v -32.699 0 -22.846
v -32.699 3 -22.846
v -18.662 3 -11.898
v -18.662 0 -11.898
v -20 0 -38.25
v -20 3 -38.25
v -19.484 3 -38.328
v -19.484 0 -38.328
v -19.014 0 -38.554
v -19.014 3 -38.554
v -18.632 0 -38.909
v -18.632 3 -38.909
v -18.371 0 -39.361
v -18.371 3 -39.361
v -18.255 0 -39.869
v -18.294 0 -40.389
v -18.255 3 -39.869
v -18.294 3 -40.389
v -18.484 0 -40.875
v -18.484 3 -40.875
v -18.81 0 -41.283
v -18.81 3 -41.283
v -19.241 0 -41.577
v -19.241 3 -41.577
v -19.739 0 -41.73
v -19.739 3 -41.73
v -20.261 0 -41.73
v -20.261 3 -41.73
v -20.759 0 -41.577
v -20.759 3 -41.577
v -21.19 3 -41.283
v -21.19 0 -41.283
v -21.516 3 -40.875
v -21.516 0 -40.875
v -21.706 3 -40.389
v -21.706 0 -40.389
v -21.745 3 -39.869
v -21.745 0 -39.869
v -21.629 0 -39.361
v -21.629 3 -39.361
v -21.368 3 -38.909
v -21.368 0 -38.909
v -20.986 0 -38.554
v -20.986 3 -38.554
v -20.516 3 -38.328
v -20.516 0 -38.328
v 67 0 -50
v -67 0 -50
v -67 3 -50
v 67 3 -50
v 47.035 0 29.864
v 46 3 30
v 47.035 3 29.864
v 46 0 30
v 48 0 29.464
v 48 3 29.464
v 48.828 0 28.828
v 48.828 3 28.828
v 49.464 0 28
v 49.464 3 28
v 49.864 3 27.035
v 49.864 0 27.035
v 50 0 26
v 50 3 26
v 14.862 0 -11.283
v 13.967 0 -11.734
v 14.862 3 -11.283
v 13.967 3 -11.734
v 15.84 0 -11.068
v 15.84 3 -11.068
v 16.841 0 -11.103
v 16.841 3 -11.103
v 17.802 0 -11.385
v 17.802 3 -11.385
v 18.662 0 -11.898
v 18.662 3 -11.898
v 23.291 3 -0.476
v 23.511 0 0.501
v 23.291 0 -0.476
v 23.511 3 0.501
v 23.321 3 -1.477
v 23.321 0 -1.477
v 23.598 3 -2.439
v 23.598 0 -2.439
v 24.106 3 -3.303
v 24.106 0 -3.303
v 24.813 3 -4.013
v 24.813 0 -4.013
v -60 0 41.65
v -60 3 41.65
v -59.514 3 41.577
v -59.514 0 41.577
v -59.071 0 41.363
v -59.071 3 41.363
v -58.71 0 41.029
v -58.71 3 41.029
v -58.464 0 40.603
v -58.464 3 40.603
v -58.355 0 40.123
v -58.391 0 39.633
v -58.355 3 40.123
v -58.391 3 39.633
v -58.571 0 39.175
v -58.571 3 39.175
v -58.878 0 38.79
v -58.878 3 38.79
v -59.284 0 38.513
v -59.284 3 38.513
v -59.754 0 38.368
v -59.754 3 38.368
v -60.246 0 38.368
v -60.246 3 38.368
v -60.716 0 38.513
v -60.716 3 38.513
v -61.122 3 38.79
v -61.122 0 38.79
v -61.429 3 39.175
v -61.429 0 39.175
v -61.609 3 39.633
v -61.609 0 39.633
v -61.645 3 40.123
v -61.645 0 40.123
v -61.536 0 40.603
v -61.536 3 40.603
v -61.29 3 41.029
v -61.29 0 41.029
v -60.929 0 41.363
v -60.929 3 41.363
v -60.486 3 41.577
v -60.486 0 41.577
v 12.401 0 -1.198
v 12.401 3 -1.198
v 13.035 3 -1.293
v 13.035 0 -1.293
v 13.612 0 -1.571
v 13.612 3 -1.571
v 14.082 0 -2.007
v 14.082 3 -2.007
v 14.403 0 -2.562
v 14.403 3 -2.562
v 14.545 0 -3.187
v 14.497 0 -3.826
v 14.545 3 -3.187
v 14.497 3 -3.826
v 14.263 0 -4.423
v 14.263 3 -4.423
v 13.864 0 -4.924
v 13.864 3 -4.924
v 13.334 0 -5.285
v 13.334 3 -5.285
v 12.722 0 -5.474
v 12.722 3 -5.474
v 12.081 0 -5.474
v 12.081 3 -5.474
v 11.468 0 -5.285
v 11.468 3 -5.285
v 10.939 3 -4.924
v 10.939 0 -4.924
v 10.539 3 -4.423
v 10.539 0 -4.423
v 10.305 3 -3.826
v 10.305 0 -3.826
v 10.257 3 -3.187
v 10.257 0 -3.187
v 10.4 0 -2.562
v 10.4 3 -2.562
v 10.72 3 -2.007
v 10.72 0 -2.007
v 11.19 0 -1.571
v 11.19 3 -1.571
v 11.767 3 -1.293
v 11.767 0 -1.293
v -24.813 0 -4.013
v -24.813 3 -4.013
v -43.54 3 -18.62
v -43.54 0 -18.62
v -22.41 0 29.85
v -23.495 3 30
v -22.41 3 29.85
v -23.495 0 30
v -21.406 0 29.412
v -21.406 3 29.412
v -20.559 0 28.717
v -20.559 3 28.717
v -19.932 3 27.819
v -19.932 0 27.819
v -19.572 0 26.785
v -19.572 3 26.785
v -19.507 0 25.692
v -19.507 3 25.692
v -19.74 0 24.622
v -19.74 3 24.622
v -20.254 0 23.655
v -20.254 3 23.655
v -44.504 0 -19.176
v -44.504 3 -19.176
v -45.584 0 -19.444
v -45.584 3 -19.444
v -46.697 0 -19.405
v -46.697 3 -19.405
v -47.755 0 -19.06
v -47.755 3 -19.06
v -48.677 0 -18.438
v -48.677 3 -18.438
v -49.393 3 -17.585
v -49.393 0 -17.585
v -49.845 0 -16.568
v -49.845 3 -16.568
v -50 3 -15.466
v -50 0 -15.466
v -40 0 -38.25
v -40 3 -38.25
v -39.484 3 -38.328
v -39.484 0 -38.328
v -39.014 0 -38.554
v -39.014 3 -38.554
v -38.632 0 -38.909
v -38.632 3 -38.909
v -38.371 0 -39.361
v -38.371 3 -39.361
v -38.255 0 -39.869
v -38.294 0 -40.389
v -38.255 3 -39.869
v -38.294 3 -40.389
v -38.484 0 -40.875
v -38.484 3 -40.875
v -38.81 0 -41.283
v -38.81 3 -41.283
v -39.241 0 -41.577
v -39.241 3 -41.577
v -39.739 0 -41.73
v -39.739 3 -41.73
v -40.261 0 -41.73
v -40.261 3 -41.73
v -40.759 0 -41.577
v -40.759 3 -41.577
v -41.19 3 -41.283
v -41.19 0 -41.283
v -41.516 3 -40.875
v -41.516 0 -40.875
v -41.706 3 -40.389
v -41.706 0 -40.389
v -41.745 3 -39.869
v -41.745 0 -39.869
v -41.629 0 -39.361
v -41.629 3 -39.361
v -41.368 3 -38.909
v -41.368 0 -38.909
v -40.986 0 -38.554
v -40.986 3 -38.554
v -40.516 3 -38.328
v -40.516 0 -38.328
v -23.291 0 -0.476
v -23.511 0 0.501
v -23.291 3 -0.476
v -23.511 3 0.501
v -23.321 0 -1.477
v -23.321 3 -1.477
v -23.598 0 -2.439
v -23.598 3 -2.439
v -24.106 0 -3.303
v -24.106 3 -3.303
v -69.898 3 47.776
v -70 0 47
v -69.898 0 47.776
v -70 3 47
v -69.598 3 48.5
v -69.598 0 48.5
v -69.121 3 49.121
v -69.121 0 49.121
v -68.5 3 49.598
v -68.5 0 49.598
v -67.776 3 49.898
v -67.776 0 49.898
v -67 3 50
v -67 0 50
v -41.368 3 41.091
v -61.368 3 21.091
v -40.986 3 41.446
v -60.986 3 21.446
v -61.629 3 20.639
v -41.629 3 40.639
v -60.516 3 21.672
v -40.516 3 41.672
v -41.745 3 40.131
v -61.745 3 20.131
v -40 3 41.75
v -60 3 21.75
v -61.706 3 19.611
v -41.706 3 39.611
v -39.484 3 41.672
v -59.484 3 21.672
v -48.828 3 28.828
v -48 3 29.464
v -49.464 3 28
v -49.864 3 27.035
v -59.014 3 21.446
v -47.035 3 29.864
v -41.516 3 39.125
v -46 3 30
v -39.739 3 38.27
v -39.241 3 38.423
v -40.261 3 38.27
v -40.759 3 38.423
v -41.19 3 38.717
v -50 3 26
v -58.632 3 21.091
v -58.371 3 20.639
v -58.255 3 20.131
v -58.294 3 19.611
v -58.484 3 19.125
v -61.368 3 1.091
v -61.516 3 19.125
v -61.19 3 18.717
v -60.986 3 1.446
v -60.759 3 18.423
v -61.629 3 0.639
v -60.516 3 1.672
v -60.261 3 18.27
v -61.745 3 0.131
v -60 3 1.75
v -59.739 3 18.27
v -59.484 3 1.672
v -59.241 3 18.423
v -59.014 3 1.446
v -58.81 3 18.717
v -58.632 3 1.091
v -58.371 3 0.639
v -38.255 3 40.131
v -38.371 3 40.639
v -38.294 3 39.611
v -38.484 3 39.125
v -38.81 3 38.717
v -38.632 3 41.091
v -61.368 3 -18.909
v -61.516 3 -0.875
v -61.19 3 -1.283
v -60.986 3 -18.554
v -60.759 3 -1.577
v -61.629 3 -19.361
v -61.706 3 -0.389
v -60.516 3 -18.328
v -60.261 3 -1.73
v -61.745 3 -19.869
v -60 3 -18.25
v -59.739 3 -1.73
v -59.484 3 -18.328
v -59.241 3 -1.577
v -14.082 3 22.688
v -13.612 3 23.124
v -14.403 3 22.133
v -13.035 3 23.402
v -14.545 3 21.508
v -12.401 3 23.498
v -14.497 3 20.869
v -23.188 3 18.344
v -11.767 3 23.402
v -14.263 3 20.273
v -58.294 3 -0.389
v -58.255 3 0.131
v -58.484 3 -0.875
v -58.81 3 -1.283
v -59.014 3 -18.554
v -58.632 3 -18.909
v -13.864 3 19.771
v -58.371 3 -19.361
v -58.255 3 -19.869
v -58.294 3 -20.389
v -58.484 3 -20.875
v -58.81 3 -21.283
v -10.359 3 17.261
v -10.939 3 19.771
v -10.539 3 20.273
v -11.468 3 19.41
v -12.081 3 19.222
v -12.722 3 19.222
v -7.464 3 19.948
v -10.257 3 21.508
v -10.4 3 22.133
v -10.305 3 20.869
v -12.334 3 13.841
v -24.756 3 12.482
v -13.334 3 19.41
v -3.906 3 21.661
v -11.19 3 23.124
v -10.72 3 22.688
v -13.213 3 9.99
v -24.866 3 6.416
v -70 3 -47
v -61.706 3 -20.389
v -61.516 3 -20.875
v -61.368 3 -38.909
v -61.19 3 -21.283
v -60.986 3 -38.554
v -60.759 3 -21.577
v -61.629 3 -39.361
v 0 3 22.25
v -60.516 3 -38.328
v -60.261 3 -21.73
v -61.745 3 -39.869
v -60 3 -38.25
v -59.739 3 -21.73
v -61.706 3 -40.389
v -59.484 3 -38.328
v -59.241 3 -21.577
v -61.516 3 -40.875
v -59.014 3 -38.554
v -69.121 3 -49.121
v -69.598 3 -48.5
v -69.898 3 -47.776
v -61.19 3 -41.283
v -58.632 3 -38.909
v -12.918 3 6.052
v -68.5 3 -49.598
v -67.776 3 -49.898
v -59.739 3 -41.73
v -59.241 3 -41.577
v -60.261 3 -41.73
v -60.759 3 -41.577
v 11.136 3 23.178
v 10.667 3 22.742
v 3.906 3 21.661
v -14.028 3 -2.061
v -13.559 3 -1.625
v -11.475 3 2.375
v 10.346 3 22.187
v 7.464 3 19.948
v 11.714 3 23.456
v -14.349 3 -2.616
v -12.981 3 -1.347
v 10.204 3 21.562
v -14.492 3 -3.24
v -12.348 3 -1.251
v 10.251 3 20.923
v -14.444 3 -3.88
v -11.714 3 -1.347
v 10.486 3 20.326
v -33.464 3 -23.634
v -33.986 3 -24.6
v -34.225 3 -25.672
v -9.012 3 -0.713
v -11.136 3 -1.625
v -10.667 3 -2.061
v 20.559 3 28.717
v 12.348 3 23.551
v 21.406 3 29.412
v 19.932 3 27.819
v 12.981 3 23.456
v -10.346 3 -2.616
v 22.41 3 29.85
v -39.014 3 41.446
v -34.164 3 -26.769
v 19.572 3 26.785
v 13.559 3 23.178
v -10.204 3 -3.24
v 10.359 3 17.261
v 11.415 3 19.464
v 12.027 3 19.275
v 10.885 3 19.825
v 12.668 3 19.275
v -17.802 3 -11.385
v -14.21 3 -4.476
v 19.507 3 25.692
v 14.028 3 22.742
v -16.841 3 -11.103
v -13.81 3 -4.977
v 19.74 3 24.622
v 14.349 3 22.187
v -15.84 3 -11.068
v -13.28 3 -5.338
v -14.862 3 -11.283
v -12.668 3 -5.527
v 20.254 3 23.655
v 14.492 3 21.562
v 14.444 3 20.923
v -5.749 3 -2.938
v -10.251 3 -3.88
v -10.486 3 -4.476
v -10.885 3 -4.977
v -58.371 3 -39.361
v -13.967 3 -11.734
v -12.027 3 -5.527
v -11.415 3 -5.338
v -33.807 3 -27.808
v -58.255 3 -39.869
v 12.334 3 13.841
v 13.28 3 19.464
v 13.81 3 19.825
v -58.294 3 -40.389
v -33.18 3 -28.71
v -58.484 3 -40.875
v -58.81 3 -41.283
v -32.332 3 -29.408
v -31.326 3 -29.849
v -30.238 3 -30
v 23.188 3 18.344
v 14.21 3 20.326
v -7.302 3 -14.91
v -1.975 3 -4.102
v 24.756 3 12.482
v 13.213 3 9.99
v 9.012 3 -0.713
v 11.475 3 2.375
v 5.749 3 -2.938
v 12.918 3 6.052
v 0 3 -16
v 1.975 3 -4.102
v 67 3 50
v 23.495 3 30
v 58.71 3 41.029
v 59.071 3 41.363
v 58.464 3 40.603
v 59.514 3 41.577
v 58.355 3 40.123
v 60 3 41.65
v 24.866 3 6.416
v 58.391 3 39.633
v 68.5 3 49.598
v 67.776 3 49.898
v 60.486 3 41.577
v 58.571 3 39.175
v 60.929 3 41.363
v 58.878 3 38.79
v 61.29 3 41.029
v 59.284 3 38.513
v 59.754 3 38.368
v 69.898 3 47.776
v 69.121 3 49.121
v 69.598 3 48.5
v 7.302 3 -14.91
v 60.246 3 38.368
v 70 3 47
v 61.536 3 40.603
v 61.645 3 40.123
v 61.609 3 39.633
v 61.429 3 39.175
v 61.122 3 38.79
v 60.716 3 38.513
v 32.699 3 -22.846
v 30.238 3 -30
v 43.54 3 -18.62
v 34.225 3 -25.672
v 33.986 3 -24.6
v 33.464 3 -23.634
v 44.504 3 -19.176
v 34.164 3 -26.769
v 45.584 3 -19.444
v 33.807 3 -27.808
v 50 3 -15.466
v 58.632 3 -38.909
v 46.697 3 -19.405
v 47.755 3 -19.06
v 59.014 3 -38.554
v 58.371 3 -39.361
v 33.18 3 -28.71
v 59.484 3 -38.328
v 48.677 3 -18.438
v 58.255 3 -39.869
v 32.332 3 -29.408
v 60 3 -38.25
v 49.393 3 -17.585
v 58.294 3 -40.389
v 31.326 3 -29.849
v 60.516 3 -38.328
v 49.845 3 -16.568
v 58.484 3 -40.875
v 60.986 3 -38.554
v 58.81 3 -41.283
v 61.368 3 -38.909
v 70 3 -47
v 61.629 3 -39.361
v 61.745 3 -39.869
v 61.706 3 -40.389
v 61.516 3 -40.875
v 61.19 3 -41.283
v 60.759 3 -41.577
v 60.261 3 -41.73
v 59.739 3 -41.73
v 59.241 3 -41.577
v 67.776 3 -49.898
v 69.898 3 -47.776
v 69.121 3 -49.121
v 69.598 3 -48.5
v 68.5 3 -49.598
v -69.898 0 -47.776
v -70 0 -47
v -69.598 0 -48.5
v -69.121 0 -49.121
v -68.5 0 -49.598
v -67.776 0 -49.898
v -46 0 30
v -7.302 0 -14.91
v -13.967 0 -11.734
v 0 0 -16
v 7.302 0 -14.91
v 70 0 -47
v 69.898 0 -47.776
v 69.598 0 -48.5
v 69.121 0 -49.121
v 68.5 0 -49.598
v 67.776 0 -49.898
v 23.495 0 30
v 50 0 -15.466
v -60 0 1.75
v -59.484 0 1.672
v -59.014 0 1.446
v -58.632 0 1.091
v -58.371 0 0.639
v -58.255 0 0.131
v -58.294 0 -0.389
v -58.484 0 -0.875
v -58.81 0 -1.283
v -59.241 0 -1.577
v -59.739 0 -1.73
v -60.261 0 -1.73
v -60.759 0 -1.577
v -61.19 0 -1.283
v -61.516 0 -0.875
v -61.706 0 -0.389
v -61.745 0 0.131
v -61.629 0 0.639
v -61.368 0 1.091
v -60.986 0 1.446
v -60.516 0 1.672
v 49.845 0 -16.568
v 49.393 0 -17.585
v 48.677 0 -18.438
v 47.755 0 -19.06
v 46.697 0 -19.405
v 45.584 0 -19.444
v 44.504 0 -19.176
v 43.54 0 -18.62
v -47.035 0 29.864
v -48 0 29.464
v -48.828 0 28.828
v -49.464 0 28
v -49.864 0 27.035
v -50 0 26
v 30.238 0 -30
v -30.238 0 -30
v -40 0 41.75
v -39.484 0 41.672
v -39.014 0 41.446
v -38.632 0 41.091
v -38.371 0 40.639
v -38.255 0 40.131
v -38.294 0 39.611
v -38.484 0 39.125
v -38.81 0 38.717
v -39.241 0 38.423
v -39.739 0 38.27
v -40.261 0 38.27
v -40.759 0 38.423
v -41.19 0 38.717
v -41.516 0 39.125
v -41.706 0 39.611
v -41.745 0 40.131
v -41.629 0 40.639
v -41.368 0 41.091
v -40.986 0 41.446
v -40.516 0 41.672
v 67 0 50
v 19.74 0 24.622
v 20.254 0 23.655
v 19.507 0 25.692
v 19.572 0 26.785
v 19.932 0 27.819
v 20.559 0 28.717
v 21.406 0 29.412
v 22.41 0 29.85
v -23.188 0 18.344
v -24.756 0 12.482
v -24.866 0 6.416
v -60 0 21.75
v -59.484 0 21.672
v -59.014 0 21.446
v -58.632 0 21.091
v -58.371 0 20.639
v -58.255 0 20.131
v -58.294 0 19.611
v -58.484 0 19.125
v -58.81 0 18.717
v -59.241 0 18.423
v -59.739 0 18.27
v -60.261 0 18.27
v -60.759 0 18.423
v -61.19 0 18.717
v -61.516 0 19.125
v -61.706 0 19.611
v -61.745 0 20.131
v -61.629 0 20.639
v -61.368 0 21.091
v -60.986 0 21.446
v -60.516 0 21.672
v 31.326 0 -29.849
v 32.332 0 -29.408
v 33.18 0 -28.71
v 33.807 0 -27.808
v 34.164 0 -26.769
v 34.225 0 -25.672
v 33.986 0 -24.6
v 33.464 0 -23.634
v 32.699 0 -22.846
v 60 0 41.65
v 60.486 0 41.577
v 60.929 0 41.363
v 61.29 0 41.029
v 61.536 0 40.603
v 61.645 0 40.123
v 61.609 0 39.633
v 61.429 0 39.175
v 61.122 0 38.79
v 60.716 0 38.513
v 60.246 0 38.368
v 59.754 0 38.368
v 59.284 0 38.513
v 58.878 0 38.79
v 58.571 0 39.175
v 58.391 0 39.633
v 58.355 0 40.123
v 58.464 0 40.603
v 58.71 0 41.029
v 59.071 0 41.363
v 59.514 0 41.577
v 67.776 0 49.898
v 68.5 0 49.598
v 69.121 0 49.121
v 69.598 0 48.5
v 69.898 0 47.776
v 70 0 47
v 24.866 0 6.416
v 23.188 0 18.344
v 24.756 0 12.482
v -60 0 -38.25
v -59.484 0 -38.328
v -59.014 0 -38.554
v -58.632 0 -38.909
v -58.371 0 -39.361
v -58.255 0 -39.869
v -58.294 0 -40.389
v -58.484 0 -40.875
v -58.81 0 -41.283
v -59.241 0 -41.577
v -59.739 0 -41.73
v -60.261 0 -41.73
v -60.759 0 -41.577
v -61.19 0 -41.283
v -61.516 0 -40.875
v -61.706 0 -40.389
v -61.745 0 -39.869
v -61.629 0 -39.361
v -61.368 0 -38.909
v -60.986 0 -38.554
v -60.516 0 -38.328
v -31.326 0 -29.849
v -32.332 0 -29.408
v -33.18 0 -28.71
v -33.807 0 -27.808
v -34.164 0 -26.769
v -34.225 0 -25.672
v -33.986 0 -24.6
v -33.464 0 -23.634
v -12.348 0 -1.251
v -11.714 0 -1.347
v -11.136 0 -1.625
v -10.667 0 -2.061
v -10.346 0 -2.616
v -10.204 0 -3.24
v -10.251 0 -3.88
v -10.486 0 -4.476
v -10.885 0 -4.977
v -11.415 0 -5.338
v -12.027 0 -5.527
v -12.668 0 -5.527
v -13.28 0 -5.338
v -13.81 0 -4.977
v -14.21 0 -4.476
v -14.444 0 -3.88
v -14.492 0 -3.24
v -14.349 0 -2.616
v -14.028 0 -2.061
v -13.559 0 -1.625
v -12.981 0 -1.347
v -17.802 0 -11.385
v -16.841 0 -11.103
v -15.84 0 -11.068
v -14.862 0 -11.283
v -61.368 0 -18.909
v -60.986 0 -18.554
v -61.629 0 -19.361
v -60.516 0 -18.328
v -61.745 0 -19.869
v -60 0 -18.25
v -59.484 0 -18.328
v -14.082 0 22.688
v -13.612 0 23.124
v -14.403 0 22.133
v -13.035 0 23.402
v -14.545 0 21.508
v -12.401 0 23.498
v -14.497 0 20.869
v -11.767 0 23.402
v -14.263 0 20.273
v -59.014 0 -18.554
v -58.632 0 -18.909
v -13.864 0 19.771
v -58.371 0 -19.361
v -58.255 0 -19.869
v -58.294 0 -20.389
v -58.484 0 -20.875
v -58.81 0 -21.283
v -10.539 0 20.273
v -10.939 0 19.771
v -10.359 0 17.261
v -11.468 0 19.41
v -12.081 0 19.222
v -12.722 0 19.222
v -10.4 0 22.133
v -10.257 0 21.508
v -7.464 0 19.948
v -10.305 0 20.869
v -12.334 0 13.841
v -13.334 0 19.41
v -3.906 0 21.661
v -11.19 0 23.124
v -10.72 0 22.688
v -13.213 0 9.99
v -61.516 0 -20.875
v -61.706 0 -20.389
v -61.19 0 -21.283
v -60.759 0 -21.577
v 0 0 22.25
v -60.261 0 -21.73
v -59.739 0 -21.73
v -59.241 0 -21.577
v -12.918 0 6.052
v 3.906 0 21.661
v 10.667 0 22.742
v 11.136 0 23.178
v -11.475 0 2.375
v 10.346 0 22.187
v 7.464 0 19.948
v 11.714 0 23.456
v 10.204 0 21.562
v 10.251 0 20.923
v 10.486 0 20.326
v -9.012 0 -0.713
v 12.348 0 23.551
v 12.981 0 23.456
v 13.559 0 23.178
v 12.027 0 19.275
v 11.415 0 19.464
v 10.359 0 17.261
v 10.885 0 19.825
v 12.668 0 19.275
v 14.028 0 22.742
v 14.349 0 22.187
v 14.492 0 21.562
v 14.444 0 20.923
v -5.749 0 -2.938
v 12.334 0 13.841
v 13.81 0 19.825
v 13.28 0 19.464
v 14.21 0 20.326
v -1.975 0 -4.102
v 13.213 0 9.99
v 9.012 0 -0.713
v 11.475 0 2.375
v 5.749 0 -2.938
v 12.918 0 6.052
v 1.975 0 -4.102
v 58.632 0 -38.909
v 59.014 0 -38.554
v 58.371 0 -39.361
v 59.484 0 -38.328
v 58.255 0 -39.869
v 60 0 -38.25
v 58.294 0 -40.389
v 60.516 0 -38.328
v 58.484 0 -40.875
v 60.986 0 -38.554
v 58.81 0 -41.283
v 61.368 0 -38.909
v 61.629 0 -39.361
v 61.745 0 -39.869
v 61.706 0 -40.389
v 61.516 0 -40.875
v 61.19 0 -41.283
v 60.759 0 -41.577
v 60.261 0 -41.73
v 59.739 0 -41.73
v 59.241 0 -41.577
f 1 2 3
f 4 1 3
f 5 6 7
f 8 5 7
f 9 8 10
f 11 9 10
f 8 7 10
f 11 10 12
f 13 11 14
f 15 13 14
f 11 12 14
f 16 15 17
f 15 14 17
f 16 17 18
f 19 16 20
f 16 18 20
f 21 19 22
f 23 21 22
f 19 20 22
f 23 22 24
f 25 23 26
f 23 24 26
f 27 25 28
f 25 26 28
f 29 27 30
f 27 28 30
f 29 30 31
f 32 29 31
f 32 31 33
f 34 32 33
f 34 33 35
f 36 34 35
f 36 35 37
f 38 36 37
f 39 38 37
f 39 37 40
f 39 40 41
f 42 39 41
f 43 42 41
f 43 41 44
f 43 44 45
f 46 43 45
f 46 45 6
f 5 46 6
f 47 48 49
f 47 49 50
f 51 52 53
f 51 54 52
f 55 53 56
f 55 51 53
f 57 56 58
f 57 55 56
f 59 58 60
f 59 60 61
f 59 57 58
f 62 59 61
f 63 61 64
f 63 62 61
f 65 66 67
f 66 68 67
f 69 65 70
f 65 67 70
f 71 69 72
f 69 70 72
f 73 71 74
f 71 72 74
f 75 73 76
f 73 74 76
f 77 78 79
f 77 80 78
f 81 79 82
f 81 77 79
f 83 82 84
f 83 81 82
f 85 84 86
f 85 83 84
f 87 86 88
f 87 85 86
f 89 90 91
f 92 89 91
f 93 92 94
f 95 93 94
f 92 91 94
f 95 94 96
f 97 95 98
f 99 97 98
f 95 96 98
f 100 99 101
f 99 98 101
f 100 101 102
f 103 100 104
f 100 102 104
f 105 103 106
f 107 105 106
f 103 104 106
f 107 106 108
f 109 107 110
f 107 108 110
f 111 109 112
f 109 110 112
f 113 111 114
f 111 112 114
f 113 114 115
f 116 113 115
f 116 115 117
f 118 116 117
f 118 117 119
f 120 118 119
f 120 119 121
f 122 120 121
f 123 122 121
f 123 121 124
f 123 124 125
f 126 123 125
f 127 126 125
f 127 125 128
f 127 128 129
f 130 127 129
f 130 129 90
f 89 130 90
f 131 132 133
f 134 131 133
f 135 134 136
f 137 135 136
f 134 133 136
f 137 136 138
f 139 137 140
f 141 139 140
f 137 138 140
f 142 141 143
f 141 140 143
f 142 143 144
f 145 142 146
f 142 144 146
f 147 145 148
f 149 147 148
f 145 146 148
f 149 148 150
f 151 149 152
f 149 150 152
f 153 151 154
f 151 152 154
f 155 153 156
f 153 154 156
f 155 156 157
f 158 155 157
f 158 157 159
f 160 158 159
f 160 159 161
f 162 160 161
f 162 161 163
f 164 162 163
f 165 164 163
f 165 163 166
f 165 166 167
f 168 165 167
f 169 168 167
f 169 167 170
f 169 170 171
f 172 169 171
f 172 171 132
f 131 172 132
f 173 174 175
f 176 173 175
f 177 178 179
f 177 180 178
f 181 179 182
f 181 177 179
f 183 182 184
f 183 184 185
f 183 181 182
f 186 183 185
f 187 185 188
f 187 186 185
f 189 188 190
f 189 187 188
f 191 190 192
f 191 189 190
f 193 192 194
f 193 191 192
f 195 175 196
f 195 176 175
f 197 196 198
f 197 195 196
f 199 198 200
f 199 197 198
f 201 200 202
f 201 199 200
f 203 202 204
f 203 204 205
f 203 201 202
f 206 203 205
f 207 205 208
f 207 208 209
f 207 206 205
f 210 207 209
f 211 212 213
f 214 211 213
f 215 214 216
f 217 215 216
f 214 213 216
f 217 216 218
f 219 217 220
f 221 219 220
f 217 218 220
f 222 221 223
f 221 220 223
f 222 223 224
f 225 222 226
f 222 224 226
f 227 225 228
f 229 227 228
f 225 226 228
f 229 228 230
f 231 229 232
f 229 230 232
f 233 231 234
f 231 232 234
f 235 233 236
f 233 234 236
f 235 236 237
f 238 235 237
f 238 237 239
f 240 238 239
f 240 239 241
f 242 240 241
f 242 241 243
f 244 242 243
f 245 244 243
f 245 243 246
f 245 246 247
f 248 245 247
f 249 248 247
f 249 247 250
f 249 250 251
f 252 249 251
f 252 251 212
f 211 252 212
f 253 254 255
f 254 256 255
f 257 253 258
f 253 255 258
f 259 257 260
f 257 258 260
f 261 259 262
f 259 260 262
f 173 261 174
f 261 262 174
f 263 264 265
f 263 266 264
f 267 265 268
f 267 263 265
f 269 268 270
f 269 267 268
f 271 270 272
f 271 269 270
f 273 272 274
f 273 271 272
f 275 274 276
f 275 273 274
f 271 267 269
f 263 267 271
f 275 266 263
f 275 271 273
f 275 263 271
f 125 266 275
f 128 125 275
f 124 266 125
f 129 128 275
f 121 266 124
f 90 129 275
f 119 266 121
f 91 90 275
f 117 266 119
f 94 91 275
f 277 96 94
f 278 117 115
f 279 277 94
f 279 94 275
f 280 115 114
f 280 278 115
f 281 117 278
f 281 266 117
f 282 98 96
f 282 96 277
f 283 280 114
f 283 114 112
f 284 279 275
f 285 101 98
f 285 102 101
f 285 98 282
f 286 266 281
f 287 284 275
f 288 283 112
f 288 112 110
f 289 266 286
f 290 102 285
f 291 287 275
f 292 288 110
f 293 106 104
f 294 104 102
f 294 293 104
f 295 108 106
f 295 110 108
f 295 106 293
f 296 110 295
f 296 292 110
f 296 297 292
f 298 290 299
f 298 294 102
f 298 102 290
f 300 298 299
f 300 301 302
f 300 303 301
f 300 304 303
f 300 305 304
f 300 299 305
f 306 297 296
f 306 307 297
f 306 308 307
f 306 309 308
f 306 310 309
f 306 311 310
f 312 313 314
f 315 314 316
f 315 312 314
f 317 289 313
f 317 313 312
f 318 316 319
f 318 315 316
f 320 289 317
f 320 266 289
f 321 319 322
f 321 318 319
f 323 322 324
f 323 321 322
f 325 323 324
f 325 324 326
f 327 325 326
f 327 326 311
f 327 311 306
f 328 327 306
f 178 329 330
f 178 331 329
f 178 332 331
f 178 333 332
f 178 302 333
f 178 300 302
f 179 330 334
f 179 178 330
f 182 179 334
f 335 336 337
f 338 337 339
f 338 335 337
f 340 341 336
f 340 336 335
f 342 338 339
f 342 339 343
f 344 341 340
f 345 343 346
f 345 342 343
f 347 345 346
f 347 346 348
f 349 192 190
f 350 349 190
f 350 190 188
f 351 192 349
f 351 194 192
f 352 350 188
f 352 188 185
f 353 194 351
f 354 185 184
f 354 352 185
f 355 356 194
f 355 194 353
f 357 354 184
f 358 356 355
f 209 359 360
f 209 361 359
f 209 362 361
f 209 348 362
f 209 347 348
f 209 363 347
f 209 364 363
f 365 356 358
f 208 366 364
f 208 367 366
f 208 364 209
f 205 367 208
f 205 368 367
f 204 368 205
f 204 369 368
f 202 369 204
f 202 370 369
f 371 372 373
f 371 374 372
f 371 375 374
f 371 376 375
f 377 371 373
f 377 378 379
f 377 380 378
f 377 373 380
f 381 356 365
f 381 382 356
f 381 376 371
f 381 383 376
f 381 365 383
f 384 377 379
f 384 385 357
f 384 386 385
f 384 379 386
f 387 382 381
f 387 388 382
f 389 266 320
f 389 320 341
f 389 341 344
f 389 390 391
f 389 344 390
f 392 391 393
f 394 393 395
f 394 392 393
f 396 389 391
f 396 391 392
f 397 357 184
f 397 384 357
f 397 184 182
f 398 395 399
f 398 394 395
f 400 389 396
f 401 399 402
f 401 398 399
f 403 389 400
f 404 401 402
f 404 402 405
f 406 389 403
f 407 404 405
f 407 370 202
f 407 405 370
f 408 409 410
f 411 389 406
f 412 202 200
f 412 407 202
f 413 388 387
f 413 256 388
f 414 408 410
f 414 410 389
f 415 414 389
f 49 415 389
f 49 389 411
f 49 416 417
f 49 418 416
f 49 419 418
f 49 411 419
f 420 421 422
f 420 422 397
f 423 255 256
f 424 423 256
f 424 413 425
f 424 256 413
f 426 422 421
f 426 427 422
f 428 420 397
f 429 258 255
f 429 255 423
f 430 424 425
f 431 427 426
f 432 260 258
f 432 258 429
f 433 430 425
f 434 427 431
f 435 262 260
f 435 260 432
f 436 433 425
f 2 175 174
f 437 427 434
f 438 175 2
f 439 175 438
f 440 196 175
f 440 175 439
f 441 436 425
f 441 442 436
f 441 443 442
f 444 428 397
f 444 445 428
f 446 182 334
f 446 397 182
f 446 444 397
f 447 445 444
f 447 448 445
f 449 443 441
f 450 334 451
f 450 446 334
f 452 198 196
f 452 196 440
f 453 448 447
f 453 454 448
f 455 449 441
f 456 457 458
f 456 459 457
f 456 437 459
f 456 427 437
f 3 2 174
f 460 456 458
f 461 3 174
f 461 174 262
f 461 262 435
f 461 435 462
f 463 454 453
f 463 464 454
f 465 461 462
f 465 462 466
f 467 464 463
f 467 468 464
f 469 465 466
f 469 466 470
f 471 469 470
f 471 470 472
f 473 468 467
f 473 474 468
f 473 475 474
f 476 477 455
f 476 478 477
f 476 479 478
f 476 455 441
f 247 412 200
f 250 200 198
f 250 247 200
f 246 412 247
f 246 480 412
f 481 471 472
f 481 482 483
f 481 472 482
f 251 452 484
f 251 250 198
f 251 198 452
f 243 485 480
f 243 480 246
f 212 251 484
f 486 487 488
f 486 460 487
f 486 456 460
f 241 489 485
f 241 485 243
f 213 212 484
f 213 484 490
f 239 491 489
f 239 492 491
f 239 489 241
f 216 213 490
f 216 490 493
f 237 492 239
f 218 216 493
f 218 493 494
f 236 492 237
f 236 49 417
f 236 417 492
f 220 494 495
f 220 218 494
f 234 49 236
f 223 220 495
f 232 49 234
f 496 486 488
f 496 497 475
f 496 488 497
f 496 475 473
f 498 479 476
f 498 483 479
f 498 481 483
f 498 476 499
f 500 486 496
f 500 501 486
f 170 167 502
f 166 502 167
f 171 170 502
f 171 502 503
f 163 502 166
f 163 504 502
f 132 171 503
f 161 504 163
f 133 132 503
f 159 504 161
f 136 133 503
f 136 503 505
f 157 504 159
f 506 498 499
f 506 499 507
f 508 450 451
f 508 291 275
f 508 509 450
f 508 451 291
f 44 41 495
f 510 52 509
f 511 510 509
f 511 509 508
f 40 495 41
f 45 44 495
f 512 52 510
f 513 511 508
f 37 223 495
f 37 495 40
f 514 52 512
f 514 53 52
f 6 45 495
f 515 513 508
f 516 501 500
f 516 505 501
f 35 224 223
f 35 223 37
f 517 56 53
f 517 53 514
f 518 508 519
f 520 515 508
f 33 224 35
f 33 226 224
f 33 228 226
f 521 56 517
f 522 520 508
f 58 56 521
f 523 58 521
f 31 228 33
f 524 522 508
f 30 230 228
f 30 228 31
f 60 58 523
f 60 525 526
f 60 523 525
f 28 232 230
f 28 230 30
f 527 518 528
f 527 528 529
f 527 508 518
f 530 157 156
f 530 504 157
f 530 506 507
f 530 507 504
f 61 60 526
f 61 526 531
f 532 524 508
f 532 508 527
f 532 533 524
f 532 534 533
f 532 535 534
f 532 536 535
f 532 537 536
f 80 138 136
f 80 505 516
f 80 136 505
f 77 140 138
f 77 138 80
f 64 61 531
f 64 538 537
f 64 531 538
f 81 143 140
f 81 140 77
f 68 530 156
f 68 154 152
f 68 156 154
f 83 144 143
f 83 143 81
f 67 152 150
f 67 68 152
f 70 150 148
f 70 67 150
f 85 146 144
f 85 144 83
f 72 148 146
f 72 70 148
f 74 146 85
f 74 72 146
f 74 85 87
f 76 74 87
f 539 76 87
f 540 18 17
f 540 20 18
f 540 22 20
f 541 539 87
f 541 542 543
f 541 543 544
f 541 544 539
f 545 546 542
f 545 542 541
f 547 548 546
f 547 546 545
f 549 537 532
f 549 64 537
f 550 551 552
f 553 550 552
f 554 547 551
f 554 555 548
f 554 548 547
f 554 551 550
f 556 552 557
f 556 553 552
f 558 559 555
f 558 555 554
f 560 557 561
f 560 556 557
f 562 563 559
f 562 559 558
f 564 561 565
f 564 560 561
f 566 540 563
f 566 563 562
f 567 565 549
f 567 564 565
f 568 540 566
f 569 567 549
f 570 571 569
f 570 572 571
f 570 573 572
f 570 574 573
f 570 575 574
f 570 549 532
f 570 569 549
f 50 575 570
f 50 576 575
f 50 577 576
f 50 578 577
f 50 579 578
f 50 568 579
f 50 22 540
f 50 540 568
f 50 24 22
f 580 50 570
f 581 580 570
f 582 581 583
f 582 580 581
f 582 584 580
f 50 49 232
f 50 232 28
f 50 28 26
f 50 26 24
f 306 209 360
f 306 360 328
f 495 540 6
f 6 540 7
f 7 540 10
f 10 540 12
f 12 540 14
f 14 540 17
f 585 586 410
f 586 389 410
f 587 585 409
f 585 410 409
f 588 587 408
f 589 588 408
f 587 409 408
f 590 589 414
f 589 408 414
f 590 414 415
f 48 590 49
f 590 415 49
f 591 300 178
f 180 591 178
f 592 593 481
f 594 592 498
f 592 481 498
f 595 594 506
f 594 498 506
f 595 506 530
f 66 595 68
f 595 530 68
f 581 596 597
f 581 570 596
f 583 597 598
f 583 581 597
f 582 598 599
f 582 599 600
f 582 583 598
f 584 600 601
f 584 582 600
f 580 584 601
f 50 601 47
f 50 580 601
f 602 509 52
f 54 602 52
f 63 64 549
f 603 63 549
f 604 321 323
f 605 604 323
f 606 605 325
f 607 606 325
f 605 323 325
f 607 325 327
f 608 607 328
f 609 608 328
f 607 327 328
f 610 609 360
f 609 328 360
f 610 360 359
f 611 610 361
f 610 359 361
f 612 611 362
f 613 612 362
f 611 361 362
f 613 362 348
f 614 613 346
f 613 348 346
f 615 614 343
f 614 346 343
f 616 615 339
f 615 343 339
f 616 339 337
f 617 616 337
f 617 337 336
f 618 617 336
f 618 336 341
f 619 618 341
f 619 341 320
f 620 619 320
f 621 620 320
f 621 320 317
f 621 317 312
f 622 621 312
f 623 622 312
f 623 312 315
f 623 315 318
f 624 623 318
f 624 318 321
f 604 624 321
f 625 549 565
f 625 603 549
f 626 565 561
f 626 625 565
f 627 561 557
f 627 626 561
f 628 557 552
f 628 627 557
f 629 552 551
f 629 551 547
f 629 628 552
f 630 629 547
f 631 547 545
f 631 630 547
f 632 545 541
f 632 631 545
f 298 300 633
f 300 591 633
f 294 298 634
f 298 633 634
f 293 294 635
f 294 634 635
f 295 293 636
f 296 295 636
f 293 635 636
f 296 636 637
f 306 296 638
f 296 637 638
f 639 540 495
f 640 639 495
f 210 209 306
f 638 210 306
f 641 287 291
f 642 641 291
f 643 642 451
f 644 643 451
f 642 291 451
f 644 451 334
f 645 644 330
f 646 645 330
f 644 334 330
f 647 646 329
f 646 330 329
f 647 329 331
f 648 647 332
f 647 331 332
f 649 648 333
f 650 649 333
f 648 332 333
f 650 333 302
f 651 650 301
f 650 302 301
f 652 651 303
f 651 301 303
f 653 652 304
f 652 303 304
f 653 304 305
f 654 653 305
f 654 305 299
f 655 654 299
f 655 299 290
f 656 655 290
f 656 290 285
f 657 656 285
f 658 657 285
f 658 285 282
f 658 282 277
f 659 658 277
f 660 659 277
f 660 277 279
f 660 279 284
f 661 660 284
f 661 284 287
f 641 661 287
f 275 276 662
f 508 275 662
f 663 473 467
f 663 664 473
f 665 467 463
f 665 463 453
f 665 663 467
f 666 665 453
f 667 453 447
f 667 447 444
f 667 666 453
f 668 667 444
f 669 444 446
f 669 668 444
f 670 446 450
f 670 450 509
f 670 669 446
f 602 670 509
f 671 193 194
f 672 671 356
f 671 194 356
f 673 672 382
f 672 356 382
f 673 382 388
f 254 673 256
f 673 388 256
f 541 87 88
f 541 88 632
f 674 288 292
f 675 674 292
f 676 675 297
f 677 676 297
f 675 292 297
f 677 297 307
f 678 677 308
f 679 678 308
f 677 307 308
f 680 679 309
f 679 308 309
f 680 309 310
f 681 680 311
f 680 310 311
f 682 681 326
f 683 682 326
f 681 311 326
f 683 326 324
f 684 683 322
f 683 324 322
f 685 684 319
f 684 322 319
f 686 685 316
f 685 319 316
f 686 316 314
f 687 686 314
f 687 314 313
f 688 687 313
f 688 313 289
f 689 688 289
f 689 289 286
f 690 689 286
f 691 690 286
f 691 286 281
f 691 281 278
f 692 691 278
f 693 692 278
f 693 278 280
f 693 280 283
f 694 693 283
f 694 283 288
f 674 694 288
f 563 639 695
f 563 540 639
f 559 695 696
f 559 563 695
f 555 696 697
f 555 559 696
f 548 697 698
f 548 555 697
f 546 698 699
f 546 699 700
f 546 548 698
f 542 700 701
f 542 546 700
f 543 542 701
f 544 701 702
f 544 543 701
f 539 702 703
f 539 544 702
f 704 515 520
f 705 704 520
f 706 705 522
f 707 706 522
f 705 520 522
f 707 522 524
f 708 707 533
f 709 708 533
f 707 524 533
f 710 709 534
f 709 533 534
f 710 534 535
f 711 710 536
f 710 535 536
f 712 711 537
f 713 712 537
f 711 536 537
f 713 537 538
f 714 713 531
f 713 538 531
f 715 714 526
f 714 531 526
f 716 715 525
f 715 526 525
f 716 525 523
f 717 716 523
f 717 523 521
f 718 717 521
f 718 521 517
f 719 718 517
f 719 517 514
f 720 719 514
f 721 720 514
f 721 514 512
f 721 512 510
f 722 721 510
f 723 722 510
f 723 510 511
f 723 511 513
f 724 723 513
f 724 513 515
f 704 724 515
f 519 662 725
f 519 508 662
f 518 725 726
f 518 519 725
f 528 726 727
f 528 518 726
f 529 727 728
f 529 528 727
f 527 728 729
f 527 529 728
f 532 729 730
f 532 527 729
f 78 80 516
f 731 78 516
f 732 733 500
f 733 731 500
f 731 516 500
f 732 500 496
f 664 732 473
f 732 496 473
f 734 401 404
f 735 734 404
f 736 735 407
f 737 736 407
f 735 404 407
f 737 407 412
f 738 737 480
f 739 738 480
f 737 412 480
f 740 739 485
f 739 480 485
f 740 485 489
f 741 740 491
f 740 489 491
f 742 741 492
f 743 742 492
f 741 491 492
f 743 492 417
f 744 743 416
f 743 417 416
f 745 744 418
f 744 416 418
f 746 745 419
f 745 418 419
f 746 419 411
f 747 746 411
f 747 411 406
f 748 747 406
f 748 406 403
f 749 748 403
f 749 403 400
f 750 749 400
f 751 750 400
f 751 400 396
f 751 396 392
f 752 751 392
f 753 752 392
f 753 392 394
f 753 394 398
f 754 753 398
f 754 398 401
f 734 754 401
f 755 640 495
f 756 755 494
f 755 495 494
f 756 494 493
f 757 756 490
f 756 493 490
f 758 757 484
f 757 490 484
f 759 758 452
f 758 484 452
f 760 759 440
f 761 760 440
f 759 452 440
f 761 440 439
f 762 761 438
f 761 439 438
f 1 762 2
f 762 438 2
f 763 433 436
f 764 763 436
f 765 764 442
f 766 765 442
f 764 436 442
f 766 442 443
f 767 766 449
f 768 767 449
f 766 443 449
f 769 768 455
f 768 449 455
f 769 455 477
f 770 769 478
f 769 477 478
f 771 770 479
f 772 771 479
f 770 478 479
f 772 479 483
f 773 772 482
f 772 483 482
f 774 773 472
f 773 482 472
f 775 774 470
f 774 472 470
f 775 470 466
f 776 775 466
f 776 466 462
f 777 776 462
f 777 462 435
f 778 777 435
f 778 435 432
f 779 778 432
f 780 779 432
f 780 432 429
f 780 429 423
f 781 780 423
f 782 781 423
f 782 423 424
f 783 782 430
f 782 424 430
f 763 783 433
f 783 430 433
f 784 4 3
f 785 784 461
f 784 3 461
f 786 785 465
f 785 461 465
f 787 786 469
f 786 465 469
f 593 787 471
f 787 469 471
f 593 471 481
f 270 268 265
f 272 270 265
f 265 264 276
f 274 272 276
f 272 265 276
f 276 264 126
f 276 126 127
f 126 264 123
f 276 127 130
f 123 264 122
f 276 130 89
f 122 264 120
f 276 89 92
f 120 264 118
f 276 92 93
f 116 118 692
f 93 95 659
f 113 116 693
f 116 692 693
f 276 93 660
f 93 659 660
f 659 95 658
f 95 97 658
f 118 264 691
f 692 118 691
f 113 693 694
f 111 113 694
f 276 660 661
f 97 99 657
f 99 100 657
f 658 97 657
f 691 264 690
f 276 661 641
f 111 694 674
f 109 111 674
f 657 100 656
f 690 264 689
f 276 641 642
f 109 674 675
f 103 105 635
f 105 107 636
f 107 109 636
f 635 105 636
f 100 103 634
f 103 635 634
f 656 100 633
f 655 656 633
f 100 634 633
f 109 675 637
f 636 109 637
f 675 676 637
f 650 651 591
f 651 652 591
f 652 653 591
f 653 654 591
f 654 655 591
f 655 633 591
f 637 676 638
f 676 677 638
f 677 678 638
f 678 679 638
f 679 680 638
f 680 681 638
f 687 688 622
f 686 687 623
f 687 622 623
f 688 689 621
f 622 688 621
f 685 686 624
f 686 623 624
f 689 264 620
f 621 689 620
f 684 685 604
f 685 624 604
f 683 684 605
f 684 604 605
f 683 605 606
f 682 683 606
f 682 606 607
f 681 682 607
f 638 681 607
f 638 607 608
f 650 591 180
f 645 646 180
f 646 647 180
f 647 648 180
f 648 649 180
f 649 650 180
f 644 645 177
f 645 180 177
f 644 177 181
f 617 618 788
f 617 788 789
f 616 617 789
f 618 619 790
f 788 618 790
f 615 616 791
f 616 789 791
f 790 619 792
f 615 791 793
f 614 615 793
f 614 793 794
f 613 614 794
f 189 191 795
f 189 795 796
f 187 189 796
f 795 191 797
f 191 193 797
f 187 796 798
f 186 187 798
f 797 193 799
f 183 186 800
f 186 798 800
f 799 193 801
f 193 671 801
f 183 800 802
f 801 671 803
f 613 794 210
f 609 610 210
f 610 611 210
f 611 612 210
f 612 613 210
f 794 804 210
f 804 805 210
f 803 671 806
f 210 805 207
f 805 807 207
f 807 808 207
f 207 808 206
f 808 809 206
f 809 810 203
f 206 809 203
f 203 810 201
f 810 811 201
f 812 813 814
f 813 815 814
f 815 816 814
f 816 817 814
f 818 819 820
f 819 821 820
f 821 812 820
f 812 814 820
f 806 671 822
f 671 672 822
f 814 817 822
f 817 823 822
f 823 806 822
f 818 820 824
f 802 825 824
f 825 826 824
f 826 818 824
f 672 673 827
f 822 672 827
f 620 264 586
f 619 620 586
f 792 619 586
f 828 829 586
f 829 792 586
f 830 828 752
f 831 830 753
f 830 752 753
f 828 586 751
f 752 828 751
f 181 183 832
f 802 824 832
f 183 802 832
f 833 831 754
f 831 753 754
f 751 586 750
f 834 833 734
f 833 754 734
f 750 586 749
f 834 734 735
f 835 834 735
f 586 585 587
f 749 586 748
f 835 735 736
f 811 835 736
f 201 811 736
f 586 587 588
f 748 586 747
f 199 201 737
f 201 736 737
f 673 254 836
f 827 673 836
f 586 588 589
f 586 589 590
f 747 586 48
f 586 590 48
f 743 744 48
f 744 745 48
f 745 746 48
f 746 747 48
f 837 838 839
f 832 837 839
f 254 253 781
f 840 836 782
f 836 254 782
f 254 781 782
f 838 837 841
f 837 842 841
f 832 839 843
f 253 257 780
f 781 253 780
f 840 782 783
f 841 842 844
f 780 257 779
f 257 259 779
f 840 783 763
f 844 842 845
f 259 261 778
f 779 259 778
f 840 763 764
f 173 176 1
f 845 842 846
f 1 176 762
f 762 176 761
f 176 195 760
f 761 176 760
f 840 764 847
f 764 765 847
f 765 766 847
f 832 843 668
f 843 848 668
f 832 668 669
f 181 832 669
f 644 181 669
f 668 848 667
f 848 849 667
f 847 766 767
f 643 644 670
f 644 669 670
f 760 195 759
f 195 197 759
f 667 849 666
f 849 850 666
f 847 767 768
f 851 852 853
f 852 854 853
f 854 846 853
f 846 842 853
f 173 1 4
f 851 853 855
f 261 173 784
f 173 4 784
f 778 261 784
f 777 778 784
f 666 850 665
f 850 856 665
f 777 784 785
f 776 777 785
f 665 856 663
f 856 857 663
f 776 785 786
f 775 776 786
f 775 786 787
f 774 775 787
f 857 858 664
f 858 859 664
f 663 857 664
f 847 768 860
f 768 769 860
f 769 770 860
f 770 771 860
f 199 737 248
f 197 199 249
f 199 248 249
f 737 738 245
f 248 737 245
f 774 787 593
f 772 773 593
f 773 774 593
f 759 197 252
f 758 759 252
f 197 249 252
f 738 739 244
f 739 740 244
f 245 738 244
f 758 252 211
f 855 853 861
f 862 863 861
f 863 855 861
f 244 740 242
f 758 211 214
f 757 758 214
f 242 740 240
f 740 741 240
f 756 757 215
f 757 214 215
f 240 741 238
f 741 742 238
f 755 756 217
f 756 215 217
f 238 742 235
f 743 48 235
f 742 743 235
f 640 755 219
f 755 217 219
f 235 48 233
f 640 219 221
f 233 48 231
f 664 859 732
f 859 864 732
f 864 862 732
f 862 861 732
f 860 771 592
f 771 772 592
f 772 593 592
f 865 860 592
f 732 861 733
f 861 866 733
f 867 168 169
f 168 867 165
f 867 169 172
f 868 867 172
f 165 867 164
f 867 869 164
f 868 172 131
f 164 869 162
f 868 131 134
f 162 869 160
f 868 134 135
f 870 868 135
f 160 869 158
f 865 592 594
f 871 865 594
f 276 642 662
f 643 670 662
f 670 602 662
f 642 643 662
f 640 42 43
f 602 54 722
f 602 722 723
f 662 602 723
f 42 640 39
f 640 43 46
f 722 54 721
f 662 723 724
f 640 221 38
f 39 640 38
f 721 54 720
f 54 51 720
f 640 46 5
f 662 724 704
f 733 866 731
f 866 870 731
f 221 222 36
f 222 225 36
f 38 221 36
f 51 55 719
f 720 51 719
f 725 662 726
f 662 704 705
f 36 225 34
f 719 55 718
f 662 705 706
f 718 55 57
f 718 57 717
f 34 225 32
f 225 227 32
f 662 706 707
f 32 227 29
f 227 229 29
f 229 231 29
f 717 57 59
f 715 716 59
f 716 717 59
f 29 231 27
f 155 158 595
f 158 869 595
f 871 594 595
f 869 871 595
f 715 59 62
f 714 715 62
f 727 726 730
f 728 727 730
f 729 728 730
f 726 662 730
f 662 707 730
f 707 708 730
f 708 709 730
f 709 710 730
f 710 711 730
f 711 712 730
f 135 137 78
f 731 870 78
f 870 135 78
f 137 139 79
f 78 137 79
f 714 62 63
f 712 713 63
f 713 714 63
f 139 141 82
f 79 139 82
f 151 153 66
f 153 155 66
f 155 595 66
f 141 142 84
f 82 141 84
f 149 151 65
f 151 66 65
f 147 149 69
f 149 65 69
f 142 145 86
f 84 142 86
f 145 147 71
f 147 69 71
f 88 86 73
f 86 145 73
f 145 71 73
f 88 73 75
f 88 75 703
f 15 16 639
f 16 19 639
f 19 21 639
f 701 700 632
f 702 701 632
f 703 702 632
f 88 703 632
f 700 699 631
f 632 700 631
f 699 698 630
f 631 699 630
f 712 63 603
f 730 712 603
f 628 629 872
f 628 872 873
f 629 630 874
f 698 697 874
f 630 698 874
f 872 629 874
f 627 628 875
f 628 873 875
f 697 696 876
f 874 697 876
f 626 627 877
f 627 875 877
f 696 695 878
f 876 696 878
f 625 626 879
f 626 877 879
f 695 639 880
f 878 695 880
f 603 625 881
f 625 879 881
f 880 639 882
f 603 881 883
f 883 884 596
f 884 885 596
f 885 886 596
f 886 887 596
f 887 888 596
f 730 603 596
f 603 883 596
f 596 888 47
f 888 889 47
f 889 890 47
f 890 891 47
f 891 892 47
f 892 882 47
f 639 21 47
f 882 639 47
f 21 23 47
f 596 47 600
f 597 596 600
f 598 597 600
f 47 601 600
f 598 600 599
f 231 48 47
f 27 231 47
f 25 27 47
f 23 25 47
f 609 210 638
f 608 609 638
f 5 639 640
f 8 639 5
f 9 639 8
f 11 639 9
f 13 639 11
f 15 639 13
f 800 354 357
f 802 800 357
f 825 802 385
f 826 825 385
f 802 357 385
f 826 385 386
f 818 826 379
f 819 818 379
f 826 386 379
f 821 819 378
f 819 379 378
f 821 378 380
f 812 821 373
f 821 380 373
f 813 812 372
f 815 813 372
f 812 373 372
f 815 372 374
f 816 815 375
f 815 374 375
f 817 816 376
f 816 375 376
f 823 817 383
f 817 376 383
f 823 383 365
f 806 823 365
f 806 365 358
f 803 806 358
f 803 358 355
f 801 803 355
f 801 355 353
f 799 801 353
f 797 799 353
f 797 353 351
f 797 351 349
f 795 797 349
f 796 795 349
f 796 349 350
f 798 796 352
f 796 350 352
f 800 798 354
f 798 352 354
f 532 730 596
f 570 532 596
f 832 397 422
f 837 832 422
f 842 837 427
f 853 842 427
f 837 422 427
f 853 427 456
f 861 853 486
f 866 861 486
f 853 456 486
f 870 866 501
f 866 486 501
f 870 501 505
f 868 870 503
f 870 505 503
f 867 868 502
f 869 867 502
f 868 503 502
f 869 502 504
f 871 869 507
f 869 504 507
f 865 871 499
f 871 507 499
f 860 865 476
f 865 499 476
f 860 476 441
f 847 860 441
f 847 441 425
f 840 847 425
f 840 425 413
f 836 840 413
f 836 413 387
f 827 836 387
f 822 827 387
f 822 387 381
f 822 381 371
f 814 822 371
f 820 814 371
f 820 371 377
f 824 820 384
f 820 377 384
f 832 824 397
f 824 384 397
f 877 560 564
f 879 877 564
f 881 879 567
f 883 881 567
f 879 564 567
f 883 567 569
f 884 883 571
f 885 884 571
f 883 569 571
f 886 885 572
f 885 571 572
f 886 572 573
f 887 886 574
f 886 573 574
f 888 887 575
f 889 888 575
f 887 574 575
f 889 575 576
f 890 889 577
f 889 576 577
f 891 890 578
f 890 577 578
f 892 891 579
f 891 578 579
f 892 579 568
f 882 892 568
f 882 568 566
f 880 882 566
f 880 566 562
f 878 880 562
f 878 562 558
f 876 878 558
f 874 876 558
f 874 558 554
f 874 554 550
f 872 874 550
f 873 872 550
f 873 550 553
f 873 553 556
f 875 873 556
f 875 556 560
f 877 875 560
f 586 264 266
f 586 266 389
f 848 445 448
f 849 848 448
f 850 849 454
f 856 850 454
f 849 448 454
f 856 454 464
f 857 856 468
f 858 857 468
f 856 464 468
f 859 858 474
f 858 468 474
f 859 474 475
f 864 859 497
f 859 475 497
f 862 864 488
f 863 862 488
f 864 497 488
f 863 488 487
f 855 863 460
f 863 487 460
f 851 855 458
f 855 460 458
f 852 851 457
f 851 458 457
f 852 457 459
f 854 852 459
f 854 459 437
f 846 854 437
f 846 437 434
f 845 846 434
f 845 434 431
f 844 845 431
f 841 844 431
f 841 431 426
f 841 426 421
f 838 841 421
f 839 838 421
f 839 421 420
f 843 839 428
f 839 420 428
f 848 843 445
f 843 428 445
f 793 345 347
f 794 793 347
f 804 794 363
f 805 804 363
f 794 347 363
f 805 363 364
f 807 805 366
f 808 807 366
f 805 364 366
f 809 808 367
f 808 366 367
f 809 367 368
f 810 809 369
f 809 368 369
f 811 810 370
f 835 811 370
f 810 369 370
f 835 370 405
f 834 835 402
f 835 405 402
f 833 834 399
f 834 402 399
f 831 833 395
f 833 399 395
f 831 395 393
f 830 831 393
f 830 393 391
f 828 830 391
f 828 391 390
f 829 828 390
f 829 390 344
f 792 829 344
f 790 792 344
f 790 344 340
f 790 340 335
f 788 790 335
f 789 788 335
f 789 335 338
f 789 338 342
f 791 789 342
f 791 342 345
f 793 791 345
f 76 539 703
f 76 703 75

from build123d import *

# Parameters (mm, degrees)
SKETCH_1_W          = 140
SKETCH_1_H          = 100
EXTRUDE_1_DEPTH     = 3
SKETCH_2_R          = 13.25
SKETCH_2_R_2        = 2.15
CUT_EXTRUDE_1_DEPTH = 3
CUT_EXTRUDE_2_REACH = 88.076
SKETCH_4_R          = 1.75
SKETCH_4_R_2        = 1.65
EXTRUDE_2_DEPTH     = 3
FILLET_1_R          = 4
FILLET_2_R          = 3
CUT_EXTRUDE_3_REACH = 88.076
SKETCH_6_R          = 1.75


with BuildPart() as part:
    # 草图1 → 凸台-拉伸1 (new body)
    with BuildSketch(Plane(origin=(0, 0, 0), x_dir=(1, 0, 0), z_dir=(0, 1, 0))):
        Rectangle(SKETCH_1_W, SKETCH_1_H)
    extrude(amount=EXTRUDE_1_DEPTH)

    # 草图2 → 切除-拉伸1 (cut)
    with BuildSketch(Plane(origin=(0, 3, 0), x_dir=(1, 0, 0), z_dir=(0, 1, 0))):
        with Locations((0, -9)):
            Circle(SKETCH_2_R)
        with Locations((-12.347550503, 3.401128843)):
            Circle(SKETCH_2_R_2)
        with Locations((12.401128843, 3.347550503)):
            Circle(SKETCH_2_R_2)
        with Locations((12.347550503, -21.401128843)):
            Circle(SKETCH_2_R_2)
        with Locations((-12.401128843, -21.347550503)):
            Circle(SKETCH_2_R_2)
    extrude(amount=-CUT_EXTRUDE_1_DEPTH, mode=Mode.SUBTRACT)

    # 草图4 → 切除-拉伸2 (cut, up to next)
    with BuildSketch(Plane(origin=(0, 3, 0), x_dir=(1, 0, 0), z_dir=(0, 1, 0)), mode=Mode.PRIVATE) as cut_extrude_2_sk1:
        with Locations((-60, 40)):
            Circle(SKETCH_4_R)
    cut_extrude_2_tool1 = extrude(cut_extrude_2_sk1.sketch, amount=-CUT_EXTRUDE_2_REACH, mode=Mode.PRIVATE) & part.part
    # 草图4 → 切除-拉伸2 (cut, up to next)
    with BuildSketch(Plane(origin=(0, 3, 0), x_dir=(1, 0, 0), z_dir=(0, 1, 0)), mode=Mode.PRIVATE) as cut_extrude_2_sk2:
        with Locations((-60, -40)):
            Circle(SKETCH_4_R_2)
    cut_extrude_2_tool2 = extrude(cut_extrude_2_sk2.sketch, amount=-CUT_EXTRUDE_2_REACH, mode=Mode.PRIVATE) & part.part
    # 草图4 → 切除-拉伸2 (cut, up to next)
    with BuildSketch(Plane(origin=(0, 3, 0), x_dir=(1, 0, 0), z_dir=(0, 1, 0)), mode=Mode.PRIVATE) as cut_extrude_2_sk3:
        with Locations((60, -40)):
            Circle(SKETCH_4_R_2)
    cut_extrude_2_tool3 = extrude(cut_extrude_2_sk3.sketch, amount=-CUT_EXTRUDE_2_REACH, mode=Mode.PRIVATE) & part.part
    # 草图4 → 切除-拉伸2 (cut, up to next)
    with BuildSketch(Plane(origin=(0, 3, 0), x_dir=(1, 0, 0), z_dir=(0, 1, 0)), mode=Mode.PRIVATE) as cut_extrude_2_sk4:
        with Locations((60, 40)):
            Circle(SKETCH_4_R)
    cut_extrude_2_tool4 = extrude(cut_extrude_2_sk4.sketch, amount=-CUT_EXTRUDE_2_REACH, mode=Mode.PRIVATE) & part.part
    # 草图4 → 切除-拉伸2 (cut, up to next)
    with BuildSketch(Plane(origin=(0, 3, 0), x_dir=(1, 0, 0), z_dir=(0, 1, 0)), mode=Mode.PRIVATE) as cut_extrude_2_sk5:
        with BuildLine():
            Line((13.564659966, -30), (50, -30))
            Line((50, -30), (50, 30))
            Line((50, 30), (-50, 30))
            Line((-50, 30), (-50, -30))
            Line((-50, -30), (-13.564659966, -30))
            ThreePointArc((-13.564659966, -30), (0, 16), (13.564659966, -30))
        make_face()
    cut_extrude_2_tool5 = extrude(cut_extrude_2_sk5.sketch, amount=-CUT_EXTRUDE_2_REACH, mode=Mode.PRIVATE) & part.part
    add(cut_extrude_2_tool1.solids().sort_by_distance((-60, 3, -40))[0], mode=Mode.SUBTRACT)
    add(cut_extrude_2_tool2.solids().sort_by_distance((-60, 3, 40))[0], mode=Mode.SUBTRACT)
    add(cut_extrude_2_tool3.solids().sort_by_distance((60, 3, 40))[0], mode=Mode.SUBTRACT)
    add(cut_extrude_2_tool4.solids().sort_by_distance((60, 3, -40))[0], mode=Mode.SUBTRACT)
    add(cut_extrude_2_tool5.solids().sort_by_distance((31.78233, 3, 28.83381))[0], mode=Mode.SUBTRACT)

    # 草图5 → 凸台-拉伸2 (add)
    with BuildSketch(Plane(origin=(0, 3, 0), x_dir=(1, 0, 0), z_dir=(0, 1, 0))):
        Polygon((46.998056898, 33.999619926), (12.318341703, 6.949442073), (18.46865969, -0.935580987), (53.001943102, 26.000380074), align=None)
        Polygon((-18.46865969, -0.935580987), (-53.001943102, 26.000380074), (-46.998056898, 33.999619926), (-12.318341703, 6.949442073), align=None)
    extrude(amount=-EXTRUDE_2_DEPTH)

    # 圆角1
    fillet_1_edges = [part.edges().sort_by_distance(p)[0] for p in [
        (16.239124114, 1.5, -10.007652354),
        (-16.239124114, 1.5, -10.007652354),
        (13.564659966, 1.5, 30),
        (-13.564659966, 1.5, 30),
        (22.389442101, 1.5, -2.122629294),
        (-22.389442101, 1.5, -2.122629294),
        (50, 1.5, 30),
        (-50, 1.5, 30),
        (50, 1.5, -23.658864455),
        (41.870339045, 1.5, -30),
        (-41.870339045, 1.5, -30),
        (-50, 1.5, -23.658864455),
    ]]
    fillet(fillet_1_edges, radius=FILLET_1_R)

    # 圆角2
    fillet_2_edges = [part.edges().sort_by_distance(p)[0] for p in [
        (70, 1.5, 50),
        (70, 1.5, -50),
        (-70, 1.5, 50),
        (-70, 1.5, -50),
    ]]
    fillet(fillet_2_edges, radius=FILLET_2_R)

    # 草图6 → 切除-拉伸3 (cut, up to next)
    with BuildSketch(Plane(origin=(0, 3, 0), x_dir=(1, 0, 0), z_dir=(0, 1, 0)), mode=Mode.PRIVATE) as cut_extrude_3_sk1:
        with Locations((-40, 40)):
            Circle(SKETCH_6_R)
    cut_extrude_3_tool1 = extrude(cut_extrude_3_sk1.sketch, amount=-CUT_EXTRUDE_3_REACH, mode=Mode.PRIVATE) & part.part
    # 草图6 → 切除-拉伸3 (cut, up to next)
    with BuildSketch(Plane(origin=(0, 3, 0), x_dir=(1, 0, 0), z_dir=(0, 1, 0)), mode=Mode.PRIVATE) as cut_extrude_3_sk2:
        with Locations((-20, 40)):
            Circle(SKETCH_6_R)
    cut_extrude_3_tool2 = extrude(cut_extrude_3_sk2.sketch, amount=-CUT_EXTRUDE_3_REACH, mode=Mode.PRIVATE) & part.part
    # 草图6 → 切除-拉伸3 (cut, up to next)
    with BuildSketch(Plane(origin=(0, 3, 0), x_dir=(1, 0, 0), z_dir=(0, 1, 0)), mode=Mode.PRIVATE) as cut_extrude_3_sk3:
        with Locations((-60, 20)):
            Circle(SKETCH_6_R)
    cut_extrude_3_tool3 = extrude(cut_extrude_3_sk3.sketch, amount=-CUT_EXTRUDE_3_REACH, mode=Mode.PRIVATE) & part.part
    # 草图6 → 切除-拉伸3 (cut, up to next)
    with BuildSketch(Plane(origin=(0, 3, 0), x_dir=(1, 0, 0), z_dir=(0, 1, 0)), mode=Mode.PRIVATE) as cut_extrude_3_sk4:
        with Locations((-60, -20)):
            Circle(SKETCH_6_R)
    cut_extrude_3_tool4 = extrude(cut_extrude_3_sk4.sketch, amount=-CUT_EXTRUDE_3_REACH, mode=Mode.PRIVATE) & part.part
    # 草图6 → 切除-拉伸3 (cut, up to next)
    with BuildSketch(Plane(origin=(0, 3, 0), x_dir=(1, 0, 0), z_dir=(0, 1, 0)), mode=Mode.PRIVATE) as cut_extrude_3_sk5:
        with Locations((-60, 0)):
            Circle(SKETCH_6_R)
    cut_extrude_3_tool5 = extrude(cut_extrude_3_sk5.sketch, amount=-CUT_EXTRUDE_3_REACH, mode=Mode.PRIVATE) & part.part
    # 草图6 → 切除-拉伸3 (cut, up to next)
    with BuildSketch(Plane(origin=(0, 3, 0), x_dir=(1, 0, 0), z_dir=(0, 1, 0)), mode=Mode.PRIVATE) as cut_extrude_3_sk6:
        with Locations((-40, -40)):
            Circle(SKETCH_6_R)
    cut_extrude_3_tool6 = extrude(cut_extrude_3_sk6.sketch, amount=-CUT_EXTRUDE_3_REACH, mode=Mode.PRIVATE) & part.part
    add(cut_extrude_3_tool1.solids().sort_by_distance((-40, 3, -40))[0], mode=Mode.SUBTRACT)
    add(cut_extrude_3_tool2.solids().sort_by_distance((-20, 3, -40))[0], mode=Mode.SUBTRACT)
    add(cut_extrude_3_tool3.solids().sort_by_distance((-60, 3, -20))[0], mode=Mode.SUBTRACT)
    add(cut_extrude_3_tool4.solids().sort_by_distance((-60, 3, 20))[0], mode=Mode.SUBTRACT)
    add(cut_extrude_3_tool5.solids().sort_by_distance((-60, 3, 0))[0], mode=Mode.SUBTRACT)
    add(cut_extrude_3_tool6.solids().sort_by_distance((-40, 3, 40))[0], mode=Mode.SUBTRACT)


solid = part.part
